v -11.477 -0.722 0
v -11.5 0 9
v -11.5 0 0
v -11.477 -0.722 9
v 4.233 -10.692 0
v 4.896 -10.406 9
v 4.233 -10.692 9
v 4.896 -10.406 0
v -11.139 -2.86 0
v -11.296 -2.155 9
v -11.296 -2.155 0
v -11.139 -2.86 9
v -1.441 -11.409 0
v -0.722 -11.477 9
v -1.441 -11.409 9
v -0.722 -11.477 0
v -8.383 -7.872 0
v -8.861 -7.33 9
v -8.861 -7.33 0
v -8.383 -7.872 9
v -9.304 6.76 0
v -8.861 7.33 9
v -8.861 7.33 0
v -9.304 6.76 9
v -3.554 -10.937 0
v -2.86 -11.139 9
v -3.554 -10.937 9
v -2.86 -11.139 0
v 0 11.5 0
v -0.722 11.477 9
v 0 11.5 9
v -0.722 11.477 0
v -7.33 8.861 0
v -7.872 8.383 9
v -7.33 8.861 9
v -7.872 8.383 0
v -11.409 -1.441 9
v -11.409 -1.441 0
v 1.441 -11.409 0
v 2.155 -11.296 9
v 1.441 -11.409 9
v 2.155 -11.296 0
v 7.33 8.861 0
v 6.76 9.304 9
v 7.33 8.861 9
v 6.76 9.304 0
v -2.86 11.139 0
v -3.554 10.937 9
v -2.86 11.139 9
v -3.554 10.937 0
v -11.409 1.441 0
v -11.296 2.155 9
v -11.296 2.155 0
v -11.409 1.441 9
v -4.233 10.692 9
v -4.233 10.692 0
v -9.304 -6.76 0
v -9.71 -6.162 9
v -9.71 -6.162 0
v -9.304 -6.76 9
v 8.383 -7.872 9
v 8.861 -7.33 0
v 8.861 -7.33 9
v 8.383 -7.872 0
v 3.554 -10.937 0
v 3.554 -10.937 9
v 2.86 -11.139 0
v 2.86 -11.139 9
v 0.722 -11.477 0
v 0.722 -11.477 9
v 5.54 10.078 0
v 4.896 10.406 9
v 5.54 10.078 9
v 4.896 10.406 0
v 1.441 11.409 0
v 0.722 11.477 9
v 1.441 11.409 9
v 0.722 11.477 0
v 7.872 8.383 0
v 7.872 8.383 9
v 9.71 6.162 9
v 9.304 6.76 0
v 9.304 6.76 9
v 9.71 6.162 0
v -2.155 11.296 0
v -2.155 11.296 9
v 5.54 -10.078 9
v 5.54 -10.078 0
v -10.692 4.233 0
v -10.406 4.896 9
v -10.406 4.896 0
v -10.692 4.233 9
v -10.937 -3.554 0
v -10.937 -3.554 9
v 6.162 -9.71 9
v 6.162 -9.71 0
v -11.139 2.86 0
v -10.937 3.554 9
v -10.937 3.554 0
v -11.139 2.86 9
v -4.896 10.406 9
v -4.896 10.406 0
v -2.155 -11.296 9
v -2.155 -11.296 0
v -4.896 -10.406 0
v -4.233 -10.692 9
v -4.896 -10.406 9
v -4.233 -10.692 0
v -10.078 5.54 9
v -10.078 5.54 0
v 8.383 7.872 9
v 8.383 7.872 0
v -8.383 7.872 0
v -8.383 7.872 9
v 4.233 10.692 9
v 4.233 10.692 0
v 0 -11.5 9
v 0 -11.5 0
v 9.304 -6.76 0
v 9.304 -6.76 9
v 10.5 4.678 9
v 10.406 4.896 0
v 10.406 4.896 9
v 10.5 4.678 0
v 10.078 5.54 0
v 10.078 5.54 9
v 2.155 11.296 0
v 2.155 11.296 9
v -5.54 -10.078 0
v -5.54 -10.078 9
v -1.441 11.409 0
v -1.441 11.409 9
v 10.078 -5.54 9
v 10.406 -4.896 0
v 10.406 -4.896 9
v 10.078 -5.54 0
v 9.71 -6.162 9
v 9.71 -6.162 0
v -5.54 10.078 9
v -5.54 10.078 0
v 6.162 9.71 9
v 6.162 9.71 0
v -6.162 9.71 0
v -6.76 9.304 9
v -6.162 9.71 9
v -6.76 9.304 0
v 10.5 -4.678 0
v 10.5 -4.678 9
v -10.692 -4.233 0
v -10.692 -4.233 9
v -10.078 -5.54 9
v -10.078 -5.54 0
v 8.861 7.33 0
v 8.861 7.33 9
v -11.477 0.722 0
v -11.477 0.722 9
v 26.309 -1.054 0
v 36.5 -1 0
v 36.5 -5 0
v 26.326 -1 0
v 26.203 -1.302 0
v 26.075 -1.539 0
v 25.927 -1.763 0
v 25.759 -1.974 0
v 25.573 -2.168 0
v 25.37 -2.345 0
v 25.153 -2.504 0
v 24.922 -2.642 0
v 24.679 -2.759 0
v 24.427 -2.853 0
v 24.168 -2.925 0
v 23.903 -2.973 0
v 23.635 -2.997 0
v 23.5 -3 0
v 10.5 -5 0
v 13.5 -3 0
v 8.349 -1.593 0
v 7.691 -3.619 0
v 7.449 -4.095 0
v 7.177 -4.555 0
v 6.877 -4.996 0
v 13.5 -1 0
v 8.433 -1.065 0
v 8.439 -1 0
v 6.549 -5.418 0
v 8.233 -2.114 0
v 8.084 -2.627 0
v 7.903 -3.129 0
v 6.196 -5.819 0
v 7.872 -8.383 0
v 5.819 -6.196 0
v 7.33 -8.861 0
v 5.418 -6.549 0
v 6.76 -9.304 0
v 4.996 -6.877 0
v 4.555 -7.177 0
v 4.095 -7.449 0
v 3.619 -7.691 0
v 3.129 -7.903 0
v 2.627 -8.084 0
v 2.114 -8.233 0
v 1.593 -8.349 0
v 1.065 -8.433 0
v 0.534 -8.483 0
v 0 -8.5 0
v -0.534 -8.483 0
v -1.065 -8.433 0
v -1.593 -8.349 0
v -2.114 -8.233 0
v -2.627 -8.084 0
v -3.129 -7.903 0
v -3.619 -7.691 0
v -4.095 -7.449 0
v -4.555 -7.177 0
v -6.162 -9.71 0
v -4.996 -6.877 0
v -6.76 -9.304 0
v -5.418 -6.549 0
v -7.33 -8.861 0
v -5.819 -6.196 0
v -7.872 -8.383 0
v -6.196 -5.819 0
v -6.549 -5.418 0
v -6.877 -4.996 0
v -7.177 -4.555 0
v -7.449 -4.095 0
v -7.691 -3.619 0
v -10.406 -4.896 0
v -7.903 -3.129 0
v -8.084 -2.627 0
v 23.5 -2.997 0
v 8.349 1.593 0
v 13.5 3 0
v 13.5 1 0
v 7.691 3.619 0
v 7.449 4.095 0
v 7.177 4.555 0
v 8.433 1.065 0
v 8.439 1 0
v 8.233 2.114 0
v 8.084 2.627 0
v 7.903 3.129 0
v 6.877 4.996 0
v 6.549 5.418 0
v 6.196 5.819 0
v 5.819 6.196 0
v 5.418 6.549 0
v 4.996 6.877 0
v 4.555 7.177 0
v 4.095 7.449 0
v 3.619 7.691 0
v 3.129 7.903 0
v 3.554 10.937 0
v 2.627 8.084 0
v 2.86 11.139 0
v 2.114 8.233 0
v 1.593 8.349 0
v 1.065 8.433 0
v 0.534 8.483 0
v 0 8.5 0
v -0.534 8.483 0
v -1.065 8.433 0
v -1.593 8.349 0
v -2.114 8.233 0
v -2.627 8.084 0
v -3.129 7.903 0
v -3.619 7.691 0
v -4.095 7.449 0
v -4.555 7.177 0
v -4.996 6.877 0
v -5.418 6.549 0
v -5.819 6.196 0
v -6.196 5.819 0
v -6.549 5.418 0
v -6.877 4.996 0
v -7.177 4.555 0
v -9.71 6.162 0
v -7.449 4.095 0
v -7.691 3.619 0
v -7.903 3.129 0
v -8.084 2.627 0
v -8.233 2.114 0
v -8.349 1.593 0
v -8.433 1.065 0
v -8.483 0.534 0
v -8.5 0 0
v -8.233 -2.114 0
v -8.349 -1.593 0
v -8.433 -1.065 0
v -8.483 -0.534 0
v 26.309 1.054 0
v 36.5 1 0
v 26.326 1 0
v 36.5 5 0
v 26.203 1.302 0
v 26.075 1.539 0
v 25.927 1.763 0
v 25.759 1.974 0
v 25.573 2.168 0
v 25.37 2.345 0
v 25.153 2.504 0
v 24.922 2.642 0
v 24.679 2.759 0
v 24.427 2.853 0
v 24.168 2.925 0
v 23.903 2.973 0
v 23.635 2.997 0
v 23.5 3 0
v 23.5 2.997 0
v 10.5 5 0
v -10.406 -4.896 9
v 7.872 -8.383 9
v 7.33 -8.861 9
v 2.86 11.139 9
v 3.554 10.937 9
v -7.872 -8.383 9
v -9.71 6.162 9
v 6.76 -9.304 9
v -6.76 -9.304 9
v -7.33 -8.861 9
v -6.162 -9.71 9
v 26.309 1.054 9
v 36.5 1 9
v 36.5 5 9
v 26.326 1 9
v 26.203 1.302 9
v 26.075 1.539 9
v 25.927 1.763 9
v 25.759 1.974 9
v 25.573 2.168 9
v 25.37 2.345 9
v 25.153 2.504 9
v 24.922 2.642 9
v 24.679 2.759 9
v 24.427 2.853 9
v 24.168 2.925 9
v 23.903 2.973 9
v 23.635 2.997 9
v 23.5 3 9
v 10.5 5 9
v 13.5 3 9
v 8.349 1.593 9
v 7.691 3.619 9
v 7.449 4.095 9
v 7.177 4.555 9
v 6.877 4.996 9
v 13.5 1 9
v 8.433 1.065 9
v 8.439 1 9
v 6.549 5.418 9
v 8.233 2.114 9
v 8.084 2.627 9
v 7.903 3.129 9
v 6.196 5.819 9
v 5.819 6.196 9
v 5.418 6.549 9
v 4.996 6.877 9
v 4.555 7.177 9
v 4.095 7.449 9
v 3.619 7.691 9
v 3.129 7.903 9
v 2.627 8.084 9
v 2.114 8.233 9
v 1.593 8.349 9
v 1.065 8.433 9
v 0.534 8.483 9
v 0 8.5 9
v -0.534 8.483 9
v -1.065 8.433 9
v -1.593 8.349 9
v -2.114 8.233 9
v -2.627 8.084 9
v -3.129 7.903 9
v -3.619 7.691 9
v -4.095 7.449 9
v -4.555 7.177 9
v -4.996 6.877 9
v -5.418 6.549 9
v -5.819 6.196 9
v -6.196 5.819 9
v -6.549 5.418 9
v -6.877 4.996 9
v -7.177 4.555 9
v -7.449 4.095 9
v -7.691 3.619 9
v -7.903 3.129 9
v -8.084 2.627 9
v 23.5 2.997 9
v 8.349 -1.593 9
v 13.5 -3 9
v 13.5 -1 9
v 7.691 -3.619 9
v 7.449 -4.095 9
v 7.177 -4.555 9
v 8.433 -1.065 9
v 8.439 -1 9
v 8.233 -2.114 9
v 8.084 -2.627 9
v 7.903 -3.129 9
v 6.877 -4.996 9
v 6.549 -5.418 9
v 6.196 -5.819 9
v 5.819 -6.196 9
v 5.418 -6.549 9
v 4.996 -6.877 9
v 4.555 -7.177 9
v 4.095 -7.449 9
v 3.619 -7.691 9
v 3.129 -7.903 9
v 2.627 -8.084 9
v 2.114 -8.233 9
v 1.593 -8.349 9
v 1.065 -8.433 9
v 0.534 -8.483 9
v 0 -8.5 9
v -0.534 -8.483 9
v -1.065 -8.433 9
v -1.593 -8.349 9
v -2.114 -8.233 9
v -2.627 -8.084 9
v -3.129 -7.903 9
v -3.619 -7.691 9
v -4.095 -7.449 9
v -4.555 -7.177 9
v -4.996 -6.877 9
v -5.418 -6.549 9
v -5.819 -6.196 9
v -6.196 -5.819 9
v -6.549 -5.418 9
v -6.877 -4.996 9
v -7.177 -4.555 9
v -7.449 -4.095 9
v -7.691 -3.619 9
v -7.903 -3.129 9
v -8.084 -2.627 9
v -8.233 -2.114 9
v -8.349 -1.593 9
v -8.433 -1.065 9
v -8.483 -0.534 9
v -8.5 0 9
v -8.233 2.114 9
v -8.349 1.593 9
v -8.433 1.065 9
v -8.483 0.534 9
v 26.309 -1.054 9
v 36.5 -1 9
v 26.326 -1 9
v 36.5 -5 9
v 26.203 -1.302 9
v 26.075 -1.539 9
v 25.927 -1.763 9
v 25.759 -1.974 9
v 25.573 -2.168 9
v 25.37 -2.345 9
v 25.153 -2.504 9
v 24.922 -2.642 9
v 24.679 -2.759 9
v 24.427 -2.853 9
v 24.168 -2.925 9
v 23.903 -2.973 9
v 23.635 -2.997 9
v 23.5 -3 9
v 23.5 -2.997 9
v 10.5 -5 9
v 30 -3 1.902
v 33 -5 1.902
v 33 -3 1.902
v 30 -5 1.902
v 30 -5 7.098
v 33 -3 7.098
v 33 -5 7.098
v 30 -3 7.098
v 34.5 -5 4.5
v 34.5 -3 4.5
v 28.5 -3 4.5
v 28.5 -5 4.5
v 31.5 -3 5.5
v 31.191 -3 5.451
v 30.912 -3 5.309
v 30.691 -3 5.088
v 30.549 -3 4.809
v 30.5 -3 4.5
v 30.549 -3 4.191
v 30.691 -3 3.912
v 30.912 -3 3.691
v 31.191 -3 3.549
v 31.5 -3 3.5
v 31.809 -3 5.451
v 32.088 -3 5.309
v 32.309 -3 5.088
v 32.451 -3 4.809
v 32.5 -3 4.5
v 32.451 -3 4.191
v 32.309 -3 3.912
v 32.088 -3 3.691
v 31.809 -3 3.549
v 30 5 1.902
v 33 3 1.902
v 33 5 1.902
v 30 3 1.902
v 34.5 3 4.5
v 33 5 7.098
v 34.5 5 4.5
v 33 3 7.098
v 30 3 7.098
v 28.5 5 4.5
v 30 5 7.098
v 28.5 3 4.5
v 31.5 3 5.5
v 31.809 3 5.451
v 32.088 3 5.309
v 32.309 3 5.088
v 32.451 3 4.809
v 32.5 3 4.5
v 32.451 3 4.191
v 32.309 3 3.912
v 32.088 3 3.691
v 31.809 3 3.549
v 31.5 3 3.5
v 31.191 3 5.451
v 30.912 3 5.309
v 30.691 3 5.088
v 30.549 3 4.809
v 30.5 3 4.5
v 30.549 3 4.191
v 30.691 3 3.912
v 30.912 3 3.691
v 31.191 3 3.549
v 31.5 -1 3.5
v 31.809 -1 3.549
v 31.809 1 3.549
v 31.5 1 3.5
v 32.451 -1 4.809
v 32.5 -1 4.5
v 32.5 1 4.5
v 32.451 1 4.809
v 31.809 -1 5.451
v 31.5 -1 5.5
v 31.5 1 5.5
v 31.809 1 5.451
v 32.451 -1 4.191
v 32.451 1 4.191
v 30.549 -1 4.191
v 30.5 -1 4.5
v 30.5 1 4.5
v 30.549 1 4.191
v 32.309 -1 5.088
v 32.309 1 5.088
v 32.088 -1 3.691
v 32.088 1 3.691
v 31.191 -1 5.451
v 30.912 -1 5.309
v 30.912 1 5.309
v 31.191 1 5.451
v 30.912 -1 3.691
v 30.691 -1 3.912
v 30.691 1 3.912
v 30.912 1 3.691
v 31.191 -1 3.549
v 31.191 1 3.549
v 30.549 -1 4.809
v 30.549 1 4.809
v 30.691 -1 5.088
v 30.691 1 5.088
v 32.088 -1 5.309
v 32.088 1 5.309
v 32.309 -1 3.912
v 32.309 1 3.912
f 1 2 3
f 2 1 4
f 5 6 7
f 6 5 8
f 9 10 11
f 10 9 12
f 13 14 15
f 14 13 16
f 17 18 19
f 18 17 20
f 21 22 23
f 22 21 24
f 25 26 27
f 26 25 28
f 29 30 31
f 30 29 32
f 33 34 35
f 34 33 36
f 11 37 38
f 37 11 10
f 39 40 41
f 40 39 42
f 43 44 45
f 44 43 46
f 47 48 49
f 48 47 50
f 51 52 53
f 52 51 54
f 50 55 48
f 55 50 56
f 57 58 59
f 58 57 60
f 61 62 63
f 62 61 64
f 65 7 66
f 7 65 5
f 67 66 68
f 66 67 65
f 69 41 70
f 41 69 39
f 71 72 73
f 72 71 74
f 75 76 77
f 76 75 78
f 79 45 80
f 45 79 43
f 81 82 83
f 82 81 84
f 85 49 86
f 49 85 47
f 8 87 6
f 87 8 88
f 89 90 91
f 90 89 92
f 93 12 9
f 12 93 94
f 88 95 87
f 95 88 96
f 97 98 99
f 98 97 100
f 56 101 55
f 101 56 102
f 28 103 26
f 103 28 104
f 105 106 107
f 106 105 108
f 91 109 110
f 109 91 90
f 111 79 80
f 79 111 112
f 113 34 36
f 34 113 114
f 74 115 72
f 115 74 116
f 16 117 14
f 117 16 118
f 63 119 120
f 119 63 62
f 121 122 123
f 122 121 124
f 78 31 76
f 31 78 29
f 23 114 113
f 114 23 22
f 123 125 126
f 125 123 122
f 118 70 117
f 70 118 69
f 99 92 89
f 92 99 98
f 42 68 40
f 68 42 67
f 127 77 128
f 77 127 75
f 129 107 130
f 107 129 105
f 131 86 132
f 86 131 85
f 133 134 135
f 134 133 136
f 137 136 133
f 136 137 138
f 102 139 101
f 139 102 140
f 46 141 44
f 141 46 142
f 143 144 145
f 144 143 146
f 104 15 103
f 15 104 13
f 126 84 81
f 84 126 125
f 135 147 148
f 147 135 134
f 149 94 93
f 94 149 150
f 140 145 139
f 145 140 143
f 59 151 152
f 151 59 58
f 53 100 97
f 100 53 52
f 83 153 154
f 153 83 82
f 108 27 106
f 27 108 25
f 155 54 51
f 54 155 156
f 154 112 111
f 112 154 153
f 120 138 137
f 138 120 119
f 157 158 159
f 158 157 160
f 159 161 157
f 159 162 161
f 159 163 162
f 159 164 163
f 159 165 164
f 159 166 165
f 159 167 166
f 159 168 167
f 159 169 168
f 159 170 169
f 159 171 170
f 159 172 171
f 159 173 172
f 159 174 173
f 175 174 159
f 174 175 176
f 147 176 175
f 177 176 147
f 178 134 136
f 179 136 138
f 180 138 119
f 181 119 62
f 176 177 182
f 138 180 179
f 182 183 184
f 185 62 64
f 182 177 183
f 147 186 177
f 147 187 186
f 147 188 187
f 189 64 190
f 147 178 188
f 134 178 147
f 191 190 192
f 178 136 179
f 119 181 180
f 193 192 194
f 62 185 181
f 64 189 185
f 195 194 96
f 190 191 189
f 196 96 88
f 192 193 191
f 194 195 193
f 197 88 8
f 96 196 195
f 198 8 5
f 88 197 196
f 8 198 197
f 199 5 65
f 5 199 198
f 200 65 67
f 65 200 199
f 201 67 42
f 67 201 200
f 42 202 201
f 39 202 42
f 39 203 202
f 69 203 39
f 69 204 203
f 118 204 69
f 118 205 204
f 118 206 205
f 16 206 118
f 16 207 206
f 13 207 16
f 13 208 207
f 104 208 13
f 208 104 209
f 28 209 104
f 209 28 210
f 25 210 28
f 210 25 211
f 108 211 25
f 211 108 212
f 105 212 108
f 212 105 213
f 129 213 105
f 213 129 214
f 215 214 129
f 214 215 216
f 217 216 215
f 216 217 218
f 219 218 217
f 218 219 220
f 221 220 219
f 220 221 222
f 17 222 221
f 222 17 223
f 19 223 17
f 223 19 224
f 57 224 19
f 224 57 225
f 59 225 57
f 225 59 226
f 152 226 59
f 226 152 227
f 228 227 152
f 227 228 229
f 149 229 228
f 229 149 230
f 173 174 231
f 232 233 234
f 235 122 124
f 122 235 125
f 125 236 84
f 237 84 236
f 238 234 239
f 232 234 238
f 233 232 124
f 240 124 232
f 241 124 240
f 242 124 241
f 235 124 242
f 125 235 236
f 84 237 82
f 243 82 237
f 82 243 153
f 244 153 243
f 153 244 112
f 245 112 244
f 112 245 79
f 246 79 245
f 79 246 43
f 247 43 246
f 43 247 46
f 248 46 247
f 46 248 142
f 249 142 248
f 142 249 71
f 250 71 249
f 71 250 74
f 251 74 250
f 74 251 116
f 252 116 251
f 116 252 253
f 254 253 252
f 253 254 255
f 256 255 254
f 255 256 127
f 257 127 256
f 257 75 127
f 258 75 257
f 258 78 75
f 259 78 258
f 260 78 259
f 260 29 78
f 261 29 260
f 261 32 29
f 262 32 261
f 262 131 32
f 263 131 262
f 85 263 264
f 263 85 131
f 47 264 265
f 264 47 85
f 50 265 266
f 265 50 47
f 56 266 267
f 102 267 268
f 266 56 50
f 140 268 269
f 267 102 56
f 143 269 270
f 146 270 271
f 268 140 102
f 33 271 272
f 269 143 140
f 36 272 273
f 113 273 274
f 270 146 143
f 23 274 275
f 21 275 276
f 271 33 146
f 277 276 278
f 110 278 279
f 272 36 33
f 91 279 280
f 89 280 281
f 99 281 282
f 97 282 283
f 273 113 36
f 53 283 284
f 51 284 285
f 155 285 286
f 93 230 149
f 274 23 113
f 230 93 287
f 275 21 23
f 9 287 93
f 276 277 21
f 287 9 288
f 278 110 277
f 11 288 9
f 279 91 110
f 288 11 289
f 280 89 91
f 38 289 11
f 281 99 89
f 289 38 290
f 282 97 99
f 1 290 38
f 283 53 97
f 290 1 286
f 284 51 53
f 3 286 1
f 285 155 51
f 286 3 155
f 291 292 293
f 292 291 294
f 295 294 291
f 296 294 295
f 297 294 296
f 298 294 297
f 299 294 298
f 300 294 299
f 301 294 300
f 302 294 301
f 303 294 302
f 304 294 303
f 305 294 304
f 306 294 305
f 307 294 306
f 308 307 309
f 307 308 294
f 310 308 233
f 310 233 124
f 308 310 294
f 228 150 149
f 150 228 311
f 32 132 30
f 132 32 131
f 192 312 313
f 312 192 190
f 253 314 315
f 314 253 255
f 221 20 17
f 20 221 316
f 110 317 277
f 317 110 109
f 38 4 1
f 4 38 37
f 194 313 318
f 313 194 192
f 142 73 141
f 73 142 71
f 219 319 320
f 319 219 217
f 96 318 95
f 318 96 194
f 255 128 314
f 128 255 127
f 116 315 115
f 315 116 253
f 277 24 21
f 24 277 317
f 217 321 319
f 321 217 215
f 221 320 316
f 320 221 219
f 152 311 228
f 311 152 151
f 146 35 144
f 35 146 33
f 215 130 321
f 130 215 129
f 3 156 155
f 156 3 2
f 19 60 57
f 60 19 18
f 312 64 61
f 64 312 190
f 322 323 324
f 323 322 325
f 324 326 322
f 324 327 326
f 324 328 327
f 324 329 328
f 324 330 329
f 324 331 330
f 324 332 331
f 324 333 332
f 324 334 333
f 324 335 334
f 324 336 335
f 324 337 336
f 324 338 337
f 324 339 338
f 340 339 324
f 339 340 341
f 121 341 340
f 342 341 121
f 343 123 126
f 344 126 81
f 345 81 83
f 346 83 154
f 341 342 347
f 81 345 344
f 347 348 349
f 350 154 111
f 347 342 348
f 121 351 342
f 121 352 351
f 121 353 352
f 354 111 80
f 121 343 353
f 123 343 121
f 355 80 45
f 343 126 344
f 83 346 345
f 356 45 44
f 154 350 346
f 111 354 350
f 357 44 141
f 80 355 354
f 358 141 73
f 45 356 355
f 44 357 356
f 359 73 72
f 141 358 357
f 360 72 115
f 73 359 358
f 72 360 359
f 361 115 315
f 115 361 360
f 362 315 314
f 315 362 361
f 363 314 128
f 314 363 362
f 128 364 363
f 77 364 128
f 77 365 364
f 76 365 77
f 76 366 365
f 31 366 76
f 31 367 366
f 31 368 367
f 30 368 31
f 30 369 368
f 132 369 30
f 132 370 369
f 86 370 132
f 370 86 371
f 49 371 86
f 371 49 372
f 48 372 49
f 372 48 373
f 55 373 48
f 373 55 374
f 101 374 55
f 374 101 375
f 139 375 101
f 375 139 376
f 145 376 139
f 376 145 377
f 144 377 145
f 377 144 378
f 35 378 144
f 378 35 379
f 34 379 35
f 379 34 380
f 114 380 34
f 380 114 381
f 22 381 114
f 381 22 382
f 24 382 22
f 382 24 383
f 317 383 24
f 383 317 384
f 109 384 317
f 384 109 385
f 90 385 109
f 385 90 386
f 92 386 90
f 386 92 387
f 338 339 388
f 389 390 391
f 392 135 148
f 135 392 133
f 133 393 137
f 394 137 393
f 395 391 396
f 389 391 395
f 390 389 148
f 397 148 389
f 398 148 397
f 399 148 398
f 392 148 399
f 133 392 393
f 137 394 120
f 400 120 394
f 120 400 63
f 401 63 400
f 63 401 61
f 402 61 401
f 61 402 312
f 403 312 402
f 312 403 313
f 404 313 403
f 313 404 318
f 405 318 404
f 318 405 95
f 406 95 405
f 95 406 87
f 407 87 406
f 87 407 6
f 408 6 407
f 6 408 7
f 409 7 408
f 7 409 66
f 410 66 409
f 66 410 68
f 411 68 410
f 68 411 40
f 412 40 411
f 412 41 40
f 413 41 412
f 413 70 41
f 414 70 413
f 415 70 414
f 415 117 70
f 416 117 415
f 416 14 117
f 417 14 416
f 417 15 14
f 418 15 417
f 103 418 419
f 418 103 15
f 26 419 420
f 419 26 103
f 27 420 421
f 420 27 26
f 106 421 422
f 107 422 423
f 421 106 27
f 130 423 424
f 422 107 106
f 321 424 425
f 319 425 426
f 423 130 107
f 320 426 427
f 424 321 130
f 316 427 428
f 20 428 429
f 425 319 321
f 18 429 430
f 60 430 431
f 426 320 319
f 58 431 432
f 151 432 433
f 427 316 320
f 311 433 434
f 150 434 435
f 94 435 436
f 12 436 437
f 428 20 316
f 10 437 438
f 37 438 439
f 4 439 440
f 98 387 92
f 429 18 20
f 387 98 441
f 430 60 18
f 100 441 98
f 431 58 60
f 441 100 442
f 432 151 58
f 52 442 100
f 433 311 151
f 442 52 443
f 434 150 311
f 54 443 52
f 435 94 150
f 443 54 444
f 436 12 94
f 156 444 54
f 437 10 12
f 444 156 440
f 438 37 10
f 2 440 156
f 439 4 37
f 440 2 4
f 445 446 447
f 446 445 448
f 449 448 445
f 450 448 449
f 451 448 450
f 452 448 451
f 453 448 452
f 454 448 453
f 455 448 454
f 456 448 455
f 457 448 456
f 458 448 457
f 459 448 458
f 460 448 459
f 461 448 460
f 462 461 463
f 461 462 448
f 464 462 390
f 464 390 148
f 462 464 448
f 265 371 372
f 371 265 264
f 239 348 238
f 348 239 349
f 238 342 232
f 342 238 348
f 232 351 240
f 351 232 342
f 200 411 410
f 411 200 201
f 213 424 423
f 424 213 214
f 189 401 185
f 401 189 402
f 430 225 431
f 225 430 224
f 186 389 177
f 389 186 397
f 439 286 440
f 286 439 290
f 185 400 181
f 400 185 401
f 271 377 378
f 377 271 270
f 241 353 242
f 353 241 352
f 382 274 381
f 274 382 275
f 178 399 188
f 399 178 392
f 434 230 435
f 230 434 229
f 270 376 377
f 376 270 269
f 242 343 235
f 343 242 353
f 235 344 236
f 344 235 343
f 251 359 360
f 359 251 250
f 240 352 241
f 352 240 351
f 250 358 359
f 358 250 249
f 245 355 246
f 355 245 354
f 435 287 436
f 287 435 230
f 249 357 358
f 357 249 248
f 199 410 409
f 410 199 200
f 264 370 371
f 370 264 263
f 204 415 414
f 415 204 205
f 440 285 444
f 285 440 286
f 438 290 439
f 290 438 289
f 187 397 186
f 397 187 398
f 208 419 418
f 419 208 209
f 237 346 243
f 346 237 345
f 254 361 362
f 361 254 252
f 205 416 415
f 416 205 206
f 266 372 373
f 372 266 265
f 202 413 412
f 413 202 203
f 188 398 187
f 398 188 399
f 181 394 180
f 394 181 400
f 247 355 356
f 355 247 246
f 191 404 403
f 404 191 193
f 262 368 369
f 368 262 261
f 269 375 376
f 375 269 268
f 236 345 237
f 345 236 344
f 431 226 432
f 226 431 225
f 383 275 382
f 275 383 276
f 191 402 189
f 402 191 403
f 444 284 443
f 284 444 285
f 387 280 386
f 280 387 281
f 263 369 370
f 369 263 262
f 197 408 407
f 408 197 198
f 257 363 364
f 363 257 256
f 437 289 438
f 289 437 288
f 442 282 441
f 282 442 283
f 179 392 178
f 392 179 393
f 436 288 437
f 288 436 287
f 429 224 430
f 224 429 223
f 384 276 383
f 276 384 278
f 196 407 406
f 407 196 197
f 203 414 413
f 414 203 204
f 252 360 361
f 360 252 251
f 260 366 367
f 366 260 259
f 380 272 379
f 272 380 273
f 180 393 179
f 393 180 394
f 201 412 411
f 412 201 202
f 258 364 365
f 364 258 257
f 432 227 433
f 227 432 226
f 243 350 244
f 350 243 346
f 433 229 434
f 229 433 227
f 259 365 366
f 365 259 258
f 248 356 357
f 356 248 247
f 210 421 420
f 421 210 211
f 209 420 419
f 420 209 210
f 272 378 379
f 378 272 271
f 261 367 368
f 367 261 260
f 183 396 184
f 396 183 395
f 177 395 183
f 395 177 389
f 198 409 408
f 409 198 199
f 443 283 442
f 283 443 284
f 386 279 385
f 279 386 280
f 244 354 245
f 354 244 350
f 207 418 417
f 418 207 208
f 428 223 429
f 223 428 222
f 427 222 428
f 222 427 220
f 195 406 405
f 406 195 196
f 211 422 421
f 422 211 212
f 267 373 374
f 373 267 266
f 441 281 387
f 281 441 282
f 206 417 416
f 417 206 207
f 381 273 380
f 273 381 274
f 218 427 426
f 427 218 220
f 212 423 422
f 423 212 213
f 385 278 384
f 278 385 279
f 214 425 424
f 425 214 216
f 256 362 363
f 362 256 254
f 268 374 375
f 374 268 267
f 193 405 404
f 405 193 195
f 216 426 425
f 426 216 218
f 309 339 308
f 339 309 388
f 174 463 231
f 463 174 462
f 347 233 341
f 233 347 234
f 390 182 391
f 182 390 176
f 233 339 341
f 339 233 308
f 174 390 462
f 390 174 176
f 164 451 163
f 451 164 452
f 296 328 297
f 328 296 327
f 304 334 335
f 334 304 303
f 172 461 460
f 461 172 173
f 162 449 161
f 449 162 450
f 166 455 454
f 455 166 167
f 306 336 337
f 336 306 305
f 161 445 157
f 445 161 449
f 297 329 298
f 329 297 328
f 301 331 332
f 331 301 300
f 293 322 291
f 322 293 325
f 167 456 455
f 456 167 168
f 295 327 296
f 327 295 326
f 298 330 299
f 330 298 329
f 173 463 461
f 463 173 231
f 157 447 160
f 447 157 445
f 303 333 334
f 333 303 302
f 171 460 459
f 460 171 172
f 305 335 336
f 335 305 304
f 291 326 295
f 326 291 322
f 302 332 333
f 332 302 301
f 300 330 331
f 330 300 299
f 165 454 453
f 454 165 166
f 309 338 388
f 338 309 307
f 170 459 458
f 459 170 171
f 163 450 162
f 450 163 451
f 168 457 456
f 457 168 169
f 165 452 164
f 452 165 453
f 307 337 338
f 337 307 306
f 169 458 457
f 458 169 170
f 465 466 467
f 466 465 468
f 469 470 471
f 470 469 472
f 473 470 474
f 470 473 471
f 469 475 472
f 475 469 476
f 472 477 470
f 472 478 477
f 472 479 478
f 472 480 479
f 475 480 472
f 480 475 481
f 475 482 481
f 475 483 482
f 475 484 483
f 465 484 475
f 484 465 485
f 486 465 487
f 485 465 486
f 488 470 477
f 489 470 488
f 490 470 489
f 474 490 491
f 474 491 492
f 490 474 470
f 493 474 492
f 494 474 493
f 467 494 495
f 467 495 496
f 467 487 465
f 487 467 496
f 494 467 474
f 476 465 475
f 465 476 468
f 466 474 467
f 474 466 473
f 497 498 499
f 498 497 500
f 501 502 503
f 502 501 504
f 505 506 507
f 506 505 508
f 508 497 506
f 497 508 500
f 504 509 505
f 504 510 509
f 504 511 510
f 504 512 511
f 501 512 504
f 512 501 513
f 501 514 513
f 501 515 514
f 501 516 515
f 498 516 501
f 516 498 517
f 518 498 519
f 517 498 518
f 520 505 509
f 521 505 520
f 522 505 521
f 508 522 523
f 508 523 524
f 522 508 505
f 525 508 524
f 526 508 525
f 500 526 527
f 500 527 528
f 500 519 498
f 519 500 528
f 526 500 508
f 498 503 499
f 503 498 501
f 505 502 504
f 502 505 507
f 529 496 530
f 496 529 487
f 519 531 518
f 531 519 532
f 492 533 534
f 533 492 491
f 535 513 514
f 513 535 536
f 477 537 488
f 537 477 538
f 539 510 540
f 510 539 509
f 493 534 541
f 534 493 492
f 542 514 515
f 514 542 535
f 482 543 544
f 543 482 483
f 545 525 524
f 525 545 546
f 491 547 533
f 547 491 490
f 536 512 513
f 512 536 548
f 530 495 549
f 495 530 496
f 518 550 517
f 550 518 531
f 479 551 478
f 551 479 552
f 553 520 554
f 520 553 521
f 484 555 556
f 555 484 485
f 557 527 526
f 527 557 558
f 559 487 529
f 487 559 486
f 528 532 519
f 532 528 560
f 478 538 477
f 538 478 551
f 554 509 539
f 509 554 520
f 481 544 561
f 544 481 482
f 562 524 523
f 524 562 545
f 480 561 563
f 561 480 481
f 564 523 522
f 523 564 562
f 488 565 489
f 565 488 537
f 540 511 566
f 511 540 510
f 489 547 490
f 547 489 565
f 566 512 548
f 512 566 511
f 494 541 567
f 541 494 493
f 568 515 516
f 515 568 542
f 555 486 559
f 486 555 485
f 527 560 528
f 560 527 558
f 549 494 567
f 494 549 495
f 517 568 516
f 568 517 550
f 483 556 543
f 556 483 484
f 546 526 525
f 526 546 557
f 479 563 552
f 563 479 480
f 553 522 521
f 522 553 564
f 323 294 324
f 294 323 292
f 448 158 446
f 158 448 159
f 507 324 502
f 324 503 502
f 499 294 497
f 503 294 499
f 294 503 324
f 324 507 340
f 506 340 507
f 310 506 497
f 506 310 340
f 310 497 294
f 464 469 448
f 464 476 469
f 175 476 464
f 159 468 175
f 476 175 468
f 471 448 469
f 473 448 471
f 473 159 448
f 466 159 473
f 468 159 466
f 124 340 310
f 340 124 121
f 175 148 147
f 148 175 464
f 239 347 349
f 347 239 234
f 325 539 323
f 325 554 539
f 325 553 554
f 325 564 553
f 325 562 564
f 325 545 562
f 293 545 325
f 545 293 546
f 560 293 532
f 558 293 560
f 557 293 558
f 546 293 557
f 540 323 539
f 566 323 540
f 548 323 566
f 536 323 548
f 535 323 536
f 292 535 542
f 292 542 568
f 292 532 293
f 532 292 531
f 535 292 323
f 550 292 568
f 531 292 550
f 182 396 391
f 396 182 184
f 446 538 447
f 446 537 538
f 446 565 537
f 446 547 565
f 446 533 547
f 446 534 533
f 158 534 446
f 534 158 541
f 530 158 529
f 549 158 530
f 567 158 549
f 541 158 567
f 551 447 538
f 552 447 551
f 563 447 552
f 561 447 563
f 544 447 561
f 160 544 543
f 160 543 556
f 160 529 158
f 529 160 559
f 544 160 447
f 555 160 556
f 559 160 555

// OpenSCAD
// file: ../../clasp/neon-like-strip-clasp.scad
use <../led-strip/led-strip.scad>;

module stripClasp(claspThickness = 4,
                  xLength = 88,
                  claspLength = 15)
{
    claspWidth = neonLikeLedStrip_width() + claspThickness; 
 
    union()
    {
        stripClasp_main(xLength = xLength,
                        claspLength = claspLength,
                        claspThickness = claspThickness,
                        claspWidth = claspWidth
                        );
    }
} 

module stripClasp_main(xLength,
                        claspLength,
                        claspThickness,
                        claspWidth)
{
    difference()
    {
        cube([xLength, claspWidth, claspLength ]);
 
        yTranslate = neonLikeLedStrip_width() / 2.0 - 1;
        xTranslate = 2;
        color("lime")
        translate([xTranslate, yTranslate, -0.01])
        neonLikeLedStrip(length = 20);

        stripClasp_screwHolder(claspLength = claspLength,
                               xLength = xLength);
    }
}
 
module stripClasp_screwHolder(claspLength, xLength)
{
    // bolt recess x2
    boltRecesRadius = 3;
    xTranslate = xLength - 5;
    yTranslate = claspLength / 2.0 ;
    zTranslate = -2;  //-15;    
    rotate([90,0,0])
    translate([xTranslate, yTranslate, zTranslate])
    color("blue")
    cylinder(r=boltRecesRadius, h=5, $fn = 6);

    zTranslate_second = -claspLength  - 4;
    rotate([90,0,0])
    translate([xTranslate, yTranslate, zTranslate_second])
    color("grey")
    cylinder(r=boltRecesRadius, h=5, $fn = 6);


    // bolt hole
    rotate([90,0,0])
    translate([xTranslate, yTranslate, zTranslate_second])
    color("green")
    cylinder(r=1, h=15, $fn = 20);
}
// file: ../../led-strip/led-strip.scad
function neonLikeLedStrip_width() = 6;

function neonLikeLedStrip_height() = 13;

module neonLikeLedStrip(length = 10)
{
    union()
    {
        radius = neonLikeLedStrip_width() / 2.0;

        cubeX = neonLikeLedStrip_height() - radius;

        cubeY = neonLikeLedStrip_width();

        color("white")
        cube([cubeX, cubeY, length]);
    
        color("green")
        translate([cubeX, radius, 0])
        cylinder(r = radius, h= length, $fn = 70);
    }
}
// file: ../../../../../../../shapes/open-cylinder/open-cylinder.scad
// TODO: Lower this to 50.
module openCylinder(height = 3,
                    outerRadius = 7,
                    innerRadius = 4.5,
                    fn = 100)
{
    $fn = fn;

    difference()
    {
        cylinder(r=outerRadius,
                 h=height);

        translate([0, 0, -1])
        cylinder(r=innerRadius,
                 h=height+1.01);
    }
}
// file: ../../neon-like-led-strip-pipe-fastener.scad
use <../../../../../shapes/open-cylinder/open-cylinder.scad>

use <led-strip/led-strip.scad>;
use <clasp/neon-like-strip-clasp.scad>;

module neonLikeLedStripPipeFastener(fastenerHeight = 9,
                                    fastenerThickness = 8,
                                    innerRadius = 33,
                                    ledStripLength = 300,
                                    showLedStrip = false)
{
    difference()
    {
        neonLikeLedStripPipeFastenerSolid(fastenerHeight = fastenerHeight,
                                         fastenerThickness = fastenerThickness,
                                         innerRadius = innerRadius,
                                         ledStripLength = ledStripLength,
                                         showLedStrip = showLedStrip);

        width = 2;
        yTranslate = -width / 2.0;
        translate([0, yTranslate, -0.01])
        cube([100, width, 25]);
    }
}

module neonLikeLedStripPipeFastenerSolid(fastenerHeight,
                                    fastenerThickness,
                                    innerRadius,
                                    ledStripLength,
                                    showLedStrip)
{
    union()
    {
        if(showLedStrip)
        {
            xTranslate = innerRadius + fastenerThickness;
            yTranslate = 0;
            zTranslate = -ledStripLength / 2.0;
            translate([xTranslate, yTranslate, zTranslate])
            neonLikeLedStrip(length = ledStripLength);
        }

        pipeFastener(fastenerThickness = fastenerThickness,
                     height = fastenerHeight,
                     innerRadius = innerRadius
                     );
   
        stipFastener(height = fastenerHeight,
                     fastenerThickness = fastenerThickness,
                     innerRadius = innerRadius);
    }    
}

module pipeFastener(fastenerThickness = 5,
                    height = 9,
                    innerRadius = 10)
{
    outerRadius = innerRadius + fastenerThickness;

    openCylinder(height = height,
                innerRadius = innerRadius,
                outerRadius = outerRadius);
}

module stipFastener(fastenerThickness = 2,
                    height = 10,
                    innerRadius = 1) 
{
    // attacherator
    attacheratorLength_x = 2;
    attacheratorLength_y = neonLikeLedStrip_width() + fastenerThickness + 1;
    attacheratorTranslate_x = fastenerThickness + innerRadius -1;
    attacheratorTranslate_y = -attacheratorLength_y / 2.0;
    color("purple")
    translate([attacheratorTranslate_x, attacheratorTranslate_y, 0])
    cube([attacheratorLength_x, attacheratorLength_y, height]);

    claspThickness = 4;
    xTranslate = innerRadius + fastenerThickness;
    yTranslate = -(neonLikeLedStrip_width() + claspThickness) / 2.0;
    translate([xTranslate, yTranslate, 0])
    stripClasp(claspThickness = claspThickness,
               xLength = height + 8 + 8,
               claspLength = height);
}
// main file
use <../../neon-like-led-strip-pipe-fastener.scad>

/*

Shadowfax

	side frame diameter

		18mm

*/

neonLikeLedStripPipeFastener(fastenerHeight = 9,
                             fastenerThickness = 3,
                             innerRadius = 8.5,
                             ledStripLength = 50);
